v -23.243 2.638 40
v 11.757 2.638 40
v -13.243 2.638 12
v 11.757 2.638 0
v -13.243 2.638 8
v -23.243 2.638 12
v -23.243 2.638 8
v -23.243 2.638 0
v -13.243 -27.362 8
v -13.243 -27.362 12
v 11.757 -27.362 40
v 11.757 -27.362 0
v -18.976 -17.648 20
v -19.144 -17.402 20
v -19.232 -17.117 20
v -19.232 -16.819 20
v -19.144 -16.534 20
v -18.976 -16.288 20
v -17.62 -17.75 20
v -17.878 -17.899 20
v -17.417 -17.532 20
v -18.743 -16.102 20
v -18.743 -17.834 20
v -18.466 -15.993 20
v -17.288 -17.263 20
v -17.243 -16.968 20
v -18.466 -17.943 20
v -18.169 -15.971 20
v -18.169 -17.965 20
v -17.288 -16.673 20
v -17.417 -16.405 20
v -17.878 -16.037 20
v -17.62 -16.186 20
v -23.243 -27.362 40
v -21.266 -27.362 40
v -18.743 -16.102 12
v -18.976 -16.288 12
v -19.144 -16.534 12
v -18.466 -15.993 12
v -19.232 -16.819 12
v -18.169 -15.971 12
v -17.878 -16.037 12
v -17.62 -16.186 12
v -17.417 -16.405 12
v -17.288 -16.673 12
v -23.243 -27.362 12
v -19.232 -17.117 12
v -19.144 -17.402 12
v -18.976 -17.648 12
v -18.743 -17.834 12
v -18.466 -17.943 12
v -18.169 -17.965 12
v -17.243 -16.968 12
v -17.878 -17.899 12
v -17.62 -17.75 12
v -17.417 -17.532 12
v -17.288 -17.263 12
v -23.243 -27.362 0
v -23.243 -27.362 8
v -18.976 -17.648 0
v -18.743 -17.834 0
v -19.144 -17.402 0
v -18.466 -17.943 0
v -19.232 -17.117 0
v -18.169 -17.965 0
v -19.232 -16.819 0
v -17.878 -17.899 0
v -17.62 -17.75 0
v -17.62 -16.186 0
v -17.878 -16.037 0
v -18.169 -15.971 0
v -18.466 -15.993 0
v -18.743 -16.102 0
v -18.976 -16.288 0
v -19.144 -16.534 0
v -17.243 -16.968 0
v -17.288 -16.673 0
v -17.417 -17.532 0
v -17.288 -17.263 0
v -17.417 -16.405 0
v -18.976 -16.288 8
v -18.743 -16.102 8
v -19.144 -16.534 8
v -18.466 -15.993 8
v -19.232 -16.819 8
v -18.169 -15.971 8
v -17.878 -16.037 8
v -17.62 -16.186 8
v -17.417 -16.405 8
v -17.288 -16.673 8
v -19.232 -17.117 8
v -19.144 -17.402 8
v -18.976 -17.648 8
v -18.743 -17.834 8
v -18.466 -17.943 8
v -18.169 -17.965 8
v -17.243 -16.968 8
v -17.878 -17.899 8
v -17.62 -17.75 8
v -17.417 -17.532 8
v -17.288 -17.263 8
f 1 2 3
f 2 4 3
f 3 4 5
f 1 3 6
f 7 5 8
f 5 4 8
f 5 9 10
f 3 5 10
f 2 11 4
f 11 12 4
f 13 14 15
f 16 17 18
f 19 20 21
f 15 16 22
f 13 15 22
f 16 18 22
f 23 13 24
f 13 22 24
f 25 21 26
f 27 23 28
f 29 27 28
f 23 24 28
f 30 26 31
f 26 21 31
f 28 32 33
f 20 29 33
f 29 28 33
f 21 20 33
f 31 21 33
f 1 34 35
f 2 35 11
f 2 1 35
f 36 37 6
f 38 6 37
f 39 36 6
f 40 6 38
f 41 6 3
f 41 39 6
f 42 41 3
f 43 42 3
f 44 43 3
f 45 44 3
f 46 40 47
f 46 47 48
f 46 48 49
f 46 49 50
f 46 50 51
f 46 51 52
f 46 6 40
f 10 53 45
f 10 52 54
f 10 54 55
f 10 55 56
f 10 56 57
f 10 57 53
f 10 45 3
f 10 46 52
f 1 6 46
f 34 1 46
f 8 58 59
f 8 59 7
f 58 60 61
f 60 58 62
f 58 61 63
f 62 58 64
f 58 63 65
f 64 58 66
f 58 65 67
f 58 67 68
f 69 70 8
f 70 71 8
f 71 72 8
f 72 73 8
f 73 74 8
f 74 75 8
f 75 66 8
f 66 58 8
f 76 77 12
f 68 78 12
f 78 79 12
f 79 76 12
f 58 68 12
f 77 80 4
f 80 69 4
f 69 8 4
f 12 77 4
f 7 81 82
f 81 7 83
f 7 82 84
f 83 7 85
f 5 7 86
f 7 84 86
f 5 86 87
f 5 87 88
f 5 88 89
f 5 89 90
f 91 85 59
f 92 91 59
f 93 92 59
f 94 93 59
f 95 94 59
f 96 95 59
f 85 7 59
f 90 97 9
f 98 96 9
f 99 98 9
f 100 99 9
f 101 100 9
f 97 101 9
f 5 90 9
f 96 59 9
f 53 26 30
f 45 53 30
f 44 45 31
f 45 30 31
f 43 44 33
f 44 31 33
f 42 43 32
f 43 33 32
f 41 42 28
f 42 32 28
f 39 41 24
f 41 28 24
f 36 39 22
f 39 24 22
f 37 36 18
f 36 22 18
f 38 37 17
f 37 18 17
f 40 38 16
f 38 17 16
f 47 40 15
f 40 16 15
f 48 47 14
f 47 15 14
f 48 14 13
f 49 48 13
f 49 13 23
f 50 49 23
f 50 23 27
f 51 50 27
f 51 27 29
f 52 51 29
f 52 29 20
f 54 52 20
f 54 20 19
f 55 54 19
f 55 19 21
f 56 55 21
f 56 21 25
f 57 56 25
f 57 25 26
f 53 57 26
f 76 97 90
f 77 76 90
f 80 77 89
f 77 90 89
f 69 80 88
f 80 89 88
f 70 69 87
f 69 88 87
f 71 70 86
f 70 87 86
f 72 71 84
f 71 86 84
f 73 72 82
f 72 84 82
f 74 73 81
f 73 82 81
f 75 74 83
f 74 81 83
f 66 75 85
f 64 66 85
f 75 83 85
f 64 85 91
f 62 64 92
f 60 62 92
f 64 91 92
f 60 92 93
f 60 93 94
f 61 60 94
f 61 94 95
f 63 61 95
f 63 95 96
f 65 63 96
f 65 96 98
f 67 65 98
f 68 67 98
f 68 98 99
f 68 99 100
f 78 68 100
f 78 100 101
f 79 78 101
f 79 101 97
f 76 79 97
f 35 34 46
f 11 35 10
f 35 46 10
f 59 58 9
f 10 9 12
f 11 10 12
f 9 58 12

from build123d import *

# Parameters (mm, degrees)
F0_W     = 35
F0_H     = 30
F1_DEPTH = 20
F2_W     = 10
F2_H     = 4
F3_DEPTH = 40
F4_R     = 1
F5_DEPTH = 25
F6_W     = 1.9774927944
F6_H     = 23.6601198859
F7_DEPTH = 20


with BuildPart() as f1:
    # F0 (on Top) → F1 (new body)
    with BuildSketch(Plane.XY):
        with Locations((-5.7433683425, -12.3615624963)):
            Rectangle(F0_W, F0_H)
    extrude(amount=F1_DEPTH)

    # F2 (on face) → F3 (cut)
    with BuildSketch(Plane.XZ.offset(27.3615624963)):
        with Locations((-18.2433683425, 10)):
            Rectangle(F2_W, F2_H)
    extrude(amount=-F3_DEPTH, mode=Mode.SUBTRACT)

    # F4 (on face) → F5 (cut)
    with BuildSketch(Plane.XY.offset(20)):
        with Locations((-18.2433683425, 3.8932797033)):
            Circle(F4_R)
        with Locations((-18.2433683425, -16.9682204723)):
            Circle(F4_R)
    extrude(amount=-F5_DEPTH, mode=Mode.SUBTRACT)

    # F6 (on face) → F7 (join)
    with BuildSketch(Plane.XY.offset(20)):
        with Locations((-22.2546219453, -15.5315025534)):
            Rectangle(F6_W, F6_H)
        Polygon((-23.2433683425, -3.7014426105), (-21.2658755481, -3.7014426105), (-21.2658755481, -27.3615624963), (11.7566316575, -27.3615624963), (11.7566316575, 2.6384375037), (-23.2433683425, 2.6384375037), align=None)
    extrude(amount=F7_DEPTH)


solid = f1.part
